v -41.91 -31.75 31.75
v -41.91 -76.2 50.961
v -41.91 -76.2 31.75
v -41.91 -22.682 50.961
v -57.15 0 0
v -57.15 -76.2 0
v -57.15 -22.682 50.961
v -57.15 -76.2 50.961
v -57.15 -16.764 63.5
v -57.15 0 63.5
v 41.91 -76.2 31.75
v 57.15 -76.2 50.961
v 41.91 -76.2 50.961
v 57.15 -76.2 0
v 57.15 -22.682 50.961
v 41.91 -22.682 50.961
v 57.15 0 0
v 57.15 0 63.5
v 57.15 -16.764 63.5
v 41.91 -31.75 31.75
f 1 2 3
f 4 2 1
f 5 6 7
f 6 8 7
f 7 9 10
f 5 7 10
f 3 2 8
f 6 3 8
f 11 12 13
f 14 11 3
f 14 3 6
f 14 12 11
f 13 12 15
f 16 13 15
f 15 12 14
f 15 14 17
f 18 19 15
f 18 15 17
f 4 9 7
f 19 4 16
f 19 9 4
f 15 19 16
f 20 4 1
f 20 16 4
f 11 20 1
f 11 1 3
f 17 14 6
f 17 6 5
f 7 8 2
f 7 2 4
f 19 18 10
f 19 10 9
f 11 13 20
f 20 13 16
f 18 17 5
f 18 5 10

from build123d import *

# Parameters (mm, degrees)
F1_DEPTH = 57.15
F2_W     = 76.2
F2_H     = 50.960924
F3_DEPTH = 15.24


with BuildPart() as f1:
    # F0 (on Right) → F1 (new body, symmetric)
    with BuildSketch(Plane.YZ):
        Polygon((-76.2, 0), (0, 0), (0, 63.5), (-16.764, 63.5), (-31.75, 31.75), (-76.2, 31.75), align=None)
    extrude(amount=F1_DEPTH, both=True)

    # F2 (on face) → F3 (join)
    with BuildSketch(Plane.YZ.offset(57.15)):
        with Locations((-38.1, 25.480462)):
            Rectangle(F2_W, F2_H)
    extrude(amount=-F3_DEPTH)

    # F4: F1 across plane


with BuildPart() as f1_1:
    add(f1.part)
    add(f1.part.mirror(Plane.YZ))


solid = f1_1.part
